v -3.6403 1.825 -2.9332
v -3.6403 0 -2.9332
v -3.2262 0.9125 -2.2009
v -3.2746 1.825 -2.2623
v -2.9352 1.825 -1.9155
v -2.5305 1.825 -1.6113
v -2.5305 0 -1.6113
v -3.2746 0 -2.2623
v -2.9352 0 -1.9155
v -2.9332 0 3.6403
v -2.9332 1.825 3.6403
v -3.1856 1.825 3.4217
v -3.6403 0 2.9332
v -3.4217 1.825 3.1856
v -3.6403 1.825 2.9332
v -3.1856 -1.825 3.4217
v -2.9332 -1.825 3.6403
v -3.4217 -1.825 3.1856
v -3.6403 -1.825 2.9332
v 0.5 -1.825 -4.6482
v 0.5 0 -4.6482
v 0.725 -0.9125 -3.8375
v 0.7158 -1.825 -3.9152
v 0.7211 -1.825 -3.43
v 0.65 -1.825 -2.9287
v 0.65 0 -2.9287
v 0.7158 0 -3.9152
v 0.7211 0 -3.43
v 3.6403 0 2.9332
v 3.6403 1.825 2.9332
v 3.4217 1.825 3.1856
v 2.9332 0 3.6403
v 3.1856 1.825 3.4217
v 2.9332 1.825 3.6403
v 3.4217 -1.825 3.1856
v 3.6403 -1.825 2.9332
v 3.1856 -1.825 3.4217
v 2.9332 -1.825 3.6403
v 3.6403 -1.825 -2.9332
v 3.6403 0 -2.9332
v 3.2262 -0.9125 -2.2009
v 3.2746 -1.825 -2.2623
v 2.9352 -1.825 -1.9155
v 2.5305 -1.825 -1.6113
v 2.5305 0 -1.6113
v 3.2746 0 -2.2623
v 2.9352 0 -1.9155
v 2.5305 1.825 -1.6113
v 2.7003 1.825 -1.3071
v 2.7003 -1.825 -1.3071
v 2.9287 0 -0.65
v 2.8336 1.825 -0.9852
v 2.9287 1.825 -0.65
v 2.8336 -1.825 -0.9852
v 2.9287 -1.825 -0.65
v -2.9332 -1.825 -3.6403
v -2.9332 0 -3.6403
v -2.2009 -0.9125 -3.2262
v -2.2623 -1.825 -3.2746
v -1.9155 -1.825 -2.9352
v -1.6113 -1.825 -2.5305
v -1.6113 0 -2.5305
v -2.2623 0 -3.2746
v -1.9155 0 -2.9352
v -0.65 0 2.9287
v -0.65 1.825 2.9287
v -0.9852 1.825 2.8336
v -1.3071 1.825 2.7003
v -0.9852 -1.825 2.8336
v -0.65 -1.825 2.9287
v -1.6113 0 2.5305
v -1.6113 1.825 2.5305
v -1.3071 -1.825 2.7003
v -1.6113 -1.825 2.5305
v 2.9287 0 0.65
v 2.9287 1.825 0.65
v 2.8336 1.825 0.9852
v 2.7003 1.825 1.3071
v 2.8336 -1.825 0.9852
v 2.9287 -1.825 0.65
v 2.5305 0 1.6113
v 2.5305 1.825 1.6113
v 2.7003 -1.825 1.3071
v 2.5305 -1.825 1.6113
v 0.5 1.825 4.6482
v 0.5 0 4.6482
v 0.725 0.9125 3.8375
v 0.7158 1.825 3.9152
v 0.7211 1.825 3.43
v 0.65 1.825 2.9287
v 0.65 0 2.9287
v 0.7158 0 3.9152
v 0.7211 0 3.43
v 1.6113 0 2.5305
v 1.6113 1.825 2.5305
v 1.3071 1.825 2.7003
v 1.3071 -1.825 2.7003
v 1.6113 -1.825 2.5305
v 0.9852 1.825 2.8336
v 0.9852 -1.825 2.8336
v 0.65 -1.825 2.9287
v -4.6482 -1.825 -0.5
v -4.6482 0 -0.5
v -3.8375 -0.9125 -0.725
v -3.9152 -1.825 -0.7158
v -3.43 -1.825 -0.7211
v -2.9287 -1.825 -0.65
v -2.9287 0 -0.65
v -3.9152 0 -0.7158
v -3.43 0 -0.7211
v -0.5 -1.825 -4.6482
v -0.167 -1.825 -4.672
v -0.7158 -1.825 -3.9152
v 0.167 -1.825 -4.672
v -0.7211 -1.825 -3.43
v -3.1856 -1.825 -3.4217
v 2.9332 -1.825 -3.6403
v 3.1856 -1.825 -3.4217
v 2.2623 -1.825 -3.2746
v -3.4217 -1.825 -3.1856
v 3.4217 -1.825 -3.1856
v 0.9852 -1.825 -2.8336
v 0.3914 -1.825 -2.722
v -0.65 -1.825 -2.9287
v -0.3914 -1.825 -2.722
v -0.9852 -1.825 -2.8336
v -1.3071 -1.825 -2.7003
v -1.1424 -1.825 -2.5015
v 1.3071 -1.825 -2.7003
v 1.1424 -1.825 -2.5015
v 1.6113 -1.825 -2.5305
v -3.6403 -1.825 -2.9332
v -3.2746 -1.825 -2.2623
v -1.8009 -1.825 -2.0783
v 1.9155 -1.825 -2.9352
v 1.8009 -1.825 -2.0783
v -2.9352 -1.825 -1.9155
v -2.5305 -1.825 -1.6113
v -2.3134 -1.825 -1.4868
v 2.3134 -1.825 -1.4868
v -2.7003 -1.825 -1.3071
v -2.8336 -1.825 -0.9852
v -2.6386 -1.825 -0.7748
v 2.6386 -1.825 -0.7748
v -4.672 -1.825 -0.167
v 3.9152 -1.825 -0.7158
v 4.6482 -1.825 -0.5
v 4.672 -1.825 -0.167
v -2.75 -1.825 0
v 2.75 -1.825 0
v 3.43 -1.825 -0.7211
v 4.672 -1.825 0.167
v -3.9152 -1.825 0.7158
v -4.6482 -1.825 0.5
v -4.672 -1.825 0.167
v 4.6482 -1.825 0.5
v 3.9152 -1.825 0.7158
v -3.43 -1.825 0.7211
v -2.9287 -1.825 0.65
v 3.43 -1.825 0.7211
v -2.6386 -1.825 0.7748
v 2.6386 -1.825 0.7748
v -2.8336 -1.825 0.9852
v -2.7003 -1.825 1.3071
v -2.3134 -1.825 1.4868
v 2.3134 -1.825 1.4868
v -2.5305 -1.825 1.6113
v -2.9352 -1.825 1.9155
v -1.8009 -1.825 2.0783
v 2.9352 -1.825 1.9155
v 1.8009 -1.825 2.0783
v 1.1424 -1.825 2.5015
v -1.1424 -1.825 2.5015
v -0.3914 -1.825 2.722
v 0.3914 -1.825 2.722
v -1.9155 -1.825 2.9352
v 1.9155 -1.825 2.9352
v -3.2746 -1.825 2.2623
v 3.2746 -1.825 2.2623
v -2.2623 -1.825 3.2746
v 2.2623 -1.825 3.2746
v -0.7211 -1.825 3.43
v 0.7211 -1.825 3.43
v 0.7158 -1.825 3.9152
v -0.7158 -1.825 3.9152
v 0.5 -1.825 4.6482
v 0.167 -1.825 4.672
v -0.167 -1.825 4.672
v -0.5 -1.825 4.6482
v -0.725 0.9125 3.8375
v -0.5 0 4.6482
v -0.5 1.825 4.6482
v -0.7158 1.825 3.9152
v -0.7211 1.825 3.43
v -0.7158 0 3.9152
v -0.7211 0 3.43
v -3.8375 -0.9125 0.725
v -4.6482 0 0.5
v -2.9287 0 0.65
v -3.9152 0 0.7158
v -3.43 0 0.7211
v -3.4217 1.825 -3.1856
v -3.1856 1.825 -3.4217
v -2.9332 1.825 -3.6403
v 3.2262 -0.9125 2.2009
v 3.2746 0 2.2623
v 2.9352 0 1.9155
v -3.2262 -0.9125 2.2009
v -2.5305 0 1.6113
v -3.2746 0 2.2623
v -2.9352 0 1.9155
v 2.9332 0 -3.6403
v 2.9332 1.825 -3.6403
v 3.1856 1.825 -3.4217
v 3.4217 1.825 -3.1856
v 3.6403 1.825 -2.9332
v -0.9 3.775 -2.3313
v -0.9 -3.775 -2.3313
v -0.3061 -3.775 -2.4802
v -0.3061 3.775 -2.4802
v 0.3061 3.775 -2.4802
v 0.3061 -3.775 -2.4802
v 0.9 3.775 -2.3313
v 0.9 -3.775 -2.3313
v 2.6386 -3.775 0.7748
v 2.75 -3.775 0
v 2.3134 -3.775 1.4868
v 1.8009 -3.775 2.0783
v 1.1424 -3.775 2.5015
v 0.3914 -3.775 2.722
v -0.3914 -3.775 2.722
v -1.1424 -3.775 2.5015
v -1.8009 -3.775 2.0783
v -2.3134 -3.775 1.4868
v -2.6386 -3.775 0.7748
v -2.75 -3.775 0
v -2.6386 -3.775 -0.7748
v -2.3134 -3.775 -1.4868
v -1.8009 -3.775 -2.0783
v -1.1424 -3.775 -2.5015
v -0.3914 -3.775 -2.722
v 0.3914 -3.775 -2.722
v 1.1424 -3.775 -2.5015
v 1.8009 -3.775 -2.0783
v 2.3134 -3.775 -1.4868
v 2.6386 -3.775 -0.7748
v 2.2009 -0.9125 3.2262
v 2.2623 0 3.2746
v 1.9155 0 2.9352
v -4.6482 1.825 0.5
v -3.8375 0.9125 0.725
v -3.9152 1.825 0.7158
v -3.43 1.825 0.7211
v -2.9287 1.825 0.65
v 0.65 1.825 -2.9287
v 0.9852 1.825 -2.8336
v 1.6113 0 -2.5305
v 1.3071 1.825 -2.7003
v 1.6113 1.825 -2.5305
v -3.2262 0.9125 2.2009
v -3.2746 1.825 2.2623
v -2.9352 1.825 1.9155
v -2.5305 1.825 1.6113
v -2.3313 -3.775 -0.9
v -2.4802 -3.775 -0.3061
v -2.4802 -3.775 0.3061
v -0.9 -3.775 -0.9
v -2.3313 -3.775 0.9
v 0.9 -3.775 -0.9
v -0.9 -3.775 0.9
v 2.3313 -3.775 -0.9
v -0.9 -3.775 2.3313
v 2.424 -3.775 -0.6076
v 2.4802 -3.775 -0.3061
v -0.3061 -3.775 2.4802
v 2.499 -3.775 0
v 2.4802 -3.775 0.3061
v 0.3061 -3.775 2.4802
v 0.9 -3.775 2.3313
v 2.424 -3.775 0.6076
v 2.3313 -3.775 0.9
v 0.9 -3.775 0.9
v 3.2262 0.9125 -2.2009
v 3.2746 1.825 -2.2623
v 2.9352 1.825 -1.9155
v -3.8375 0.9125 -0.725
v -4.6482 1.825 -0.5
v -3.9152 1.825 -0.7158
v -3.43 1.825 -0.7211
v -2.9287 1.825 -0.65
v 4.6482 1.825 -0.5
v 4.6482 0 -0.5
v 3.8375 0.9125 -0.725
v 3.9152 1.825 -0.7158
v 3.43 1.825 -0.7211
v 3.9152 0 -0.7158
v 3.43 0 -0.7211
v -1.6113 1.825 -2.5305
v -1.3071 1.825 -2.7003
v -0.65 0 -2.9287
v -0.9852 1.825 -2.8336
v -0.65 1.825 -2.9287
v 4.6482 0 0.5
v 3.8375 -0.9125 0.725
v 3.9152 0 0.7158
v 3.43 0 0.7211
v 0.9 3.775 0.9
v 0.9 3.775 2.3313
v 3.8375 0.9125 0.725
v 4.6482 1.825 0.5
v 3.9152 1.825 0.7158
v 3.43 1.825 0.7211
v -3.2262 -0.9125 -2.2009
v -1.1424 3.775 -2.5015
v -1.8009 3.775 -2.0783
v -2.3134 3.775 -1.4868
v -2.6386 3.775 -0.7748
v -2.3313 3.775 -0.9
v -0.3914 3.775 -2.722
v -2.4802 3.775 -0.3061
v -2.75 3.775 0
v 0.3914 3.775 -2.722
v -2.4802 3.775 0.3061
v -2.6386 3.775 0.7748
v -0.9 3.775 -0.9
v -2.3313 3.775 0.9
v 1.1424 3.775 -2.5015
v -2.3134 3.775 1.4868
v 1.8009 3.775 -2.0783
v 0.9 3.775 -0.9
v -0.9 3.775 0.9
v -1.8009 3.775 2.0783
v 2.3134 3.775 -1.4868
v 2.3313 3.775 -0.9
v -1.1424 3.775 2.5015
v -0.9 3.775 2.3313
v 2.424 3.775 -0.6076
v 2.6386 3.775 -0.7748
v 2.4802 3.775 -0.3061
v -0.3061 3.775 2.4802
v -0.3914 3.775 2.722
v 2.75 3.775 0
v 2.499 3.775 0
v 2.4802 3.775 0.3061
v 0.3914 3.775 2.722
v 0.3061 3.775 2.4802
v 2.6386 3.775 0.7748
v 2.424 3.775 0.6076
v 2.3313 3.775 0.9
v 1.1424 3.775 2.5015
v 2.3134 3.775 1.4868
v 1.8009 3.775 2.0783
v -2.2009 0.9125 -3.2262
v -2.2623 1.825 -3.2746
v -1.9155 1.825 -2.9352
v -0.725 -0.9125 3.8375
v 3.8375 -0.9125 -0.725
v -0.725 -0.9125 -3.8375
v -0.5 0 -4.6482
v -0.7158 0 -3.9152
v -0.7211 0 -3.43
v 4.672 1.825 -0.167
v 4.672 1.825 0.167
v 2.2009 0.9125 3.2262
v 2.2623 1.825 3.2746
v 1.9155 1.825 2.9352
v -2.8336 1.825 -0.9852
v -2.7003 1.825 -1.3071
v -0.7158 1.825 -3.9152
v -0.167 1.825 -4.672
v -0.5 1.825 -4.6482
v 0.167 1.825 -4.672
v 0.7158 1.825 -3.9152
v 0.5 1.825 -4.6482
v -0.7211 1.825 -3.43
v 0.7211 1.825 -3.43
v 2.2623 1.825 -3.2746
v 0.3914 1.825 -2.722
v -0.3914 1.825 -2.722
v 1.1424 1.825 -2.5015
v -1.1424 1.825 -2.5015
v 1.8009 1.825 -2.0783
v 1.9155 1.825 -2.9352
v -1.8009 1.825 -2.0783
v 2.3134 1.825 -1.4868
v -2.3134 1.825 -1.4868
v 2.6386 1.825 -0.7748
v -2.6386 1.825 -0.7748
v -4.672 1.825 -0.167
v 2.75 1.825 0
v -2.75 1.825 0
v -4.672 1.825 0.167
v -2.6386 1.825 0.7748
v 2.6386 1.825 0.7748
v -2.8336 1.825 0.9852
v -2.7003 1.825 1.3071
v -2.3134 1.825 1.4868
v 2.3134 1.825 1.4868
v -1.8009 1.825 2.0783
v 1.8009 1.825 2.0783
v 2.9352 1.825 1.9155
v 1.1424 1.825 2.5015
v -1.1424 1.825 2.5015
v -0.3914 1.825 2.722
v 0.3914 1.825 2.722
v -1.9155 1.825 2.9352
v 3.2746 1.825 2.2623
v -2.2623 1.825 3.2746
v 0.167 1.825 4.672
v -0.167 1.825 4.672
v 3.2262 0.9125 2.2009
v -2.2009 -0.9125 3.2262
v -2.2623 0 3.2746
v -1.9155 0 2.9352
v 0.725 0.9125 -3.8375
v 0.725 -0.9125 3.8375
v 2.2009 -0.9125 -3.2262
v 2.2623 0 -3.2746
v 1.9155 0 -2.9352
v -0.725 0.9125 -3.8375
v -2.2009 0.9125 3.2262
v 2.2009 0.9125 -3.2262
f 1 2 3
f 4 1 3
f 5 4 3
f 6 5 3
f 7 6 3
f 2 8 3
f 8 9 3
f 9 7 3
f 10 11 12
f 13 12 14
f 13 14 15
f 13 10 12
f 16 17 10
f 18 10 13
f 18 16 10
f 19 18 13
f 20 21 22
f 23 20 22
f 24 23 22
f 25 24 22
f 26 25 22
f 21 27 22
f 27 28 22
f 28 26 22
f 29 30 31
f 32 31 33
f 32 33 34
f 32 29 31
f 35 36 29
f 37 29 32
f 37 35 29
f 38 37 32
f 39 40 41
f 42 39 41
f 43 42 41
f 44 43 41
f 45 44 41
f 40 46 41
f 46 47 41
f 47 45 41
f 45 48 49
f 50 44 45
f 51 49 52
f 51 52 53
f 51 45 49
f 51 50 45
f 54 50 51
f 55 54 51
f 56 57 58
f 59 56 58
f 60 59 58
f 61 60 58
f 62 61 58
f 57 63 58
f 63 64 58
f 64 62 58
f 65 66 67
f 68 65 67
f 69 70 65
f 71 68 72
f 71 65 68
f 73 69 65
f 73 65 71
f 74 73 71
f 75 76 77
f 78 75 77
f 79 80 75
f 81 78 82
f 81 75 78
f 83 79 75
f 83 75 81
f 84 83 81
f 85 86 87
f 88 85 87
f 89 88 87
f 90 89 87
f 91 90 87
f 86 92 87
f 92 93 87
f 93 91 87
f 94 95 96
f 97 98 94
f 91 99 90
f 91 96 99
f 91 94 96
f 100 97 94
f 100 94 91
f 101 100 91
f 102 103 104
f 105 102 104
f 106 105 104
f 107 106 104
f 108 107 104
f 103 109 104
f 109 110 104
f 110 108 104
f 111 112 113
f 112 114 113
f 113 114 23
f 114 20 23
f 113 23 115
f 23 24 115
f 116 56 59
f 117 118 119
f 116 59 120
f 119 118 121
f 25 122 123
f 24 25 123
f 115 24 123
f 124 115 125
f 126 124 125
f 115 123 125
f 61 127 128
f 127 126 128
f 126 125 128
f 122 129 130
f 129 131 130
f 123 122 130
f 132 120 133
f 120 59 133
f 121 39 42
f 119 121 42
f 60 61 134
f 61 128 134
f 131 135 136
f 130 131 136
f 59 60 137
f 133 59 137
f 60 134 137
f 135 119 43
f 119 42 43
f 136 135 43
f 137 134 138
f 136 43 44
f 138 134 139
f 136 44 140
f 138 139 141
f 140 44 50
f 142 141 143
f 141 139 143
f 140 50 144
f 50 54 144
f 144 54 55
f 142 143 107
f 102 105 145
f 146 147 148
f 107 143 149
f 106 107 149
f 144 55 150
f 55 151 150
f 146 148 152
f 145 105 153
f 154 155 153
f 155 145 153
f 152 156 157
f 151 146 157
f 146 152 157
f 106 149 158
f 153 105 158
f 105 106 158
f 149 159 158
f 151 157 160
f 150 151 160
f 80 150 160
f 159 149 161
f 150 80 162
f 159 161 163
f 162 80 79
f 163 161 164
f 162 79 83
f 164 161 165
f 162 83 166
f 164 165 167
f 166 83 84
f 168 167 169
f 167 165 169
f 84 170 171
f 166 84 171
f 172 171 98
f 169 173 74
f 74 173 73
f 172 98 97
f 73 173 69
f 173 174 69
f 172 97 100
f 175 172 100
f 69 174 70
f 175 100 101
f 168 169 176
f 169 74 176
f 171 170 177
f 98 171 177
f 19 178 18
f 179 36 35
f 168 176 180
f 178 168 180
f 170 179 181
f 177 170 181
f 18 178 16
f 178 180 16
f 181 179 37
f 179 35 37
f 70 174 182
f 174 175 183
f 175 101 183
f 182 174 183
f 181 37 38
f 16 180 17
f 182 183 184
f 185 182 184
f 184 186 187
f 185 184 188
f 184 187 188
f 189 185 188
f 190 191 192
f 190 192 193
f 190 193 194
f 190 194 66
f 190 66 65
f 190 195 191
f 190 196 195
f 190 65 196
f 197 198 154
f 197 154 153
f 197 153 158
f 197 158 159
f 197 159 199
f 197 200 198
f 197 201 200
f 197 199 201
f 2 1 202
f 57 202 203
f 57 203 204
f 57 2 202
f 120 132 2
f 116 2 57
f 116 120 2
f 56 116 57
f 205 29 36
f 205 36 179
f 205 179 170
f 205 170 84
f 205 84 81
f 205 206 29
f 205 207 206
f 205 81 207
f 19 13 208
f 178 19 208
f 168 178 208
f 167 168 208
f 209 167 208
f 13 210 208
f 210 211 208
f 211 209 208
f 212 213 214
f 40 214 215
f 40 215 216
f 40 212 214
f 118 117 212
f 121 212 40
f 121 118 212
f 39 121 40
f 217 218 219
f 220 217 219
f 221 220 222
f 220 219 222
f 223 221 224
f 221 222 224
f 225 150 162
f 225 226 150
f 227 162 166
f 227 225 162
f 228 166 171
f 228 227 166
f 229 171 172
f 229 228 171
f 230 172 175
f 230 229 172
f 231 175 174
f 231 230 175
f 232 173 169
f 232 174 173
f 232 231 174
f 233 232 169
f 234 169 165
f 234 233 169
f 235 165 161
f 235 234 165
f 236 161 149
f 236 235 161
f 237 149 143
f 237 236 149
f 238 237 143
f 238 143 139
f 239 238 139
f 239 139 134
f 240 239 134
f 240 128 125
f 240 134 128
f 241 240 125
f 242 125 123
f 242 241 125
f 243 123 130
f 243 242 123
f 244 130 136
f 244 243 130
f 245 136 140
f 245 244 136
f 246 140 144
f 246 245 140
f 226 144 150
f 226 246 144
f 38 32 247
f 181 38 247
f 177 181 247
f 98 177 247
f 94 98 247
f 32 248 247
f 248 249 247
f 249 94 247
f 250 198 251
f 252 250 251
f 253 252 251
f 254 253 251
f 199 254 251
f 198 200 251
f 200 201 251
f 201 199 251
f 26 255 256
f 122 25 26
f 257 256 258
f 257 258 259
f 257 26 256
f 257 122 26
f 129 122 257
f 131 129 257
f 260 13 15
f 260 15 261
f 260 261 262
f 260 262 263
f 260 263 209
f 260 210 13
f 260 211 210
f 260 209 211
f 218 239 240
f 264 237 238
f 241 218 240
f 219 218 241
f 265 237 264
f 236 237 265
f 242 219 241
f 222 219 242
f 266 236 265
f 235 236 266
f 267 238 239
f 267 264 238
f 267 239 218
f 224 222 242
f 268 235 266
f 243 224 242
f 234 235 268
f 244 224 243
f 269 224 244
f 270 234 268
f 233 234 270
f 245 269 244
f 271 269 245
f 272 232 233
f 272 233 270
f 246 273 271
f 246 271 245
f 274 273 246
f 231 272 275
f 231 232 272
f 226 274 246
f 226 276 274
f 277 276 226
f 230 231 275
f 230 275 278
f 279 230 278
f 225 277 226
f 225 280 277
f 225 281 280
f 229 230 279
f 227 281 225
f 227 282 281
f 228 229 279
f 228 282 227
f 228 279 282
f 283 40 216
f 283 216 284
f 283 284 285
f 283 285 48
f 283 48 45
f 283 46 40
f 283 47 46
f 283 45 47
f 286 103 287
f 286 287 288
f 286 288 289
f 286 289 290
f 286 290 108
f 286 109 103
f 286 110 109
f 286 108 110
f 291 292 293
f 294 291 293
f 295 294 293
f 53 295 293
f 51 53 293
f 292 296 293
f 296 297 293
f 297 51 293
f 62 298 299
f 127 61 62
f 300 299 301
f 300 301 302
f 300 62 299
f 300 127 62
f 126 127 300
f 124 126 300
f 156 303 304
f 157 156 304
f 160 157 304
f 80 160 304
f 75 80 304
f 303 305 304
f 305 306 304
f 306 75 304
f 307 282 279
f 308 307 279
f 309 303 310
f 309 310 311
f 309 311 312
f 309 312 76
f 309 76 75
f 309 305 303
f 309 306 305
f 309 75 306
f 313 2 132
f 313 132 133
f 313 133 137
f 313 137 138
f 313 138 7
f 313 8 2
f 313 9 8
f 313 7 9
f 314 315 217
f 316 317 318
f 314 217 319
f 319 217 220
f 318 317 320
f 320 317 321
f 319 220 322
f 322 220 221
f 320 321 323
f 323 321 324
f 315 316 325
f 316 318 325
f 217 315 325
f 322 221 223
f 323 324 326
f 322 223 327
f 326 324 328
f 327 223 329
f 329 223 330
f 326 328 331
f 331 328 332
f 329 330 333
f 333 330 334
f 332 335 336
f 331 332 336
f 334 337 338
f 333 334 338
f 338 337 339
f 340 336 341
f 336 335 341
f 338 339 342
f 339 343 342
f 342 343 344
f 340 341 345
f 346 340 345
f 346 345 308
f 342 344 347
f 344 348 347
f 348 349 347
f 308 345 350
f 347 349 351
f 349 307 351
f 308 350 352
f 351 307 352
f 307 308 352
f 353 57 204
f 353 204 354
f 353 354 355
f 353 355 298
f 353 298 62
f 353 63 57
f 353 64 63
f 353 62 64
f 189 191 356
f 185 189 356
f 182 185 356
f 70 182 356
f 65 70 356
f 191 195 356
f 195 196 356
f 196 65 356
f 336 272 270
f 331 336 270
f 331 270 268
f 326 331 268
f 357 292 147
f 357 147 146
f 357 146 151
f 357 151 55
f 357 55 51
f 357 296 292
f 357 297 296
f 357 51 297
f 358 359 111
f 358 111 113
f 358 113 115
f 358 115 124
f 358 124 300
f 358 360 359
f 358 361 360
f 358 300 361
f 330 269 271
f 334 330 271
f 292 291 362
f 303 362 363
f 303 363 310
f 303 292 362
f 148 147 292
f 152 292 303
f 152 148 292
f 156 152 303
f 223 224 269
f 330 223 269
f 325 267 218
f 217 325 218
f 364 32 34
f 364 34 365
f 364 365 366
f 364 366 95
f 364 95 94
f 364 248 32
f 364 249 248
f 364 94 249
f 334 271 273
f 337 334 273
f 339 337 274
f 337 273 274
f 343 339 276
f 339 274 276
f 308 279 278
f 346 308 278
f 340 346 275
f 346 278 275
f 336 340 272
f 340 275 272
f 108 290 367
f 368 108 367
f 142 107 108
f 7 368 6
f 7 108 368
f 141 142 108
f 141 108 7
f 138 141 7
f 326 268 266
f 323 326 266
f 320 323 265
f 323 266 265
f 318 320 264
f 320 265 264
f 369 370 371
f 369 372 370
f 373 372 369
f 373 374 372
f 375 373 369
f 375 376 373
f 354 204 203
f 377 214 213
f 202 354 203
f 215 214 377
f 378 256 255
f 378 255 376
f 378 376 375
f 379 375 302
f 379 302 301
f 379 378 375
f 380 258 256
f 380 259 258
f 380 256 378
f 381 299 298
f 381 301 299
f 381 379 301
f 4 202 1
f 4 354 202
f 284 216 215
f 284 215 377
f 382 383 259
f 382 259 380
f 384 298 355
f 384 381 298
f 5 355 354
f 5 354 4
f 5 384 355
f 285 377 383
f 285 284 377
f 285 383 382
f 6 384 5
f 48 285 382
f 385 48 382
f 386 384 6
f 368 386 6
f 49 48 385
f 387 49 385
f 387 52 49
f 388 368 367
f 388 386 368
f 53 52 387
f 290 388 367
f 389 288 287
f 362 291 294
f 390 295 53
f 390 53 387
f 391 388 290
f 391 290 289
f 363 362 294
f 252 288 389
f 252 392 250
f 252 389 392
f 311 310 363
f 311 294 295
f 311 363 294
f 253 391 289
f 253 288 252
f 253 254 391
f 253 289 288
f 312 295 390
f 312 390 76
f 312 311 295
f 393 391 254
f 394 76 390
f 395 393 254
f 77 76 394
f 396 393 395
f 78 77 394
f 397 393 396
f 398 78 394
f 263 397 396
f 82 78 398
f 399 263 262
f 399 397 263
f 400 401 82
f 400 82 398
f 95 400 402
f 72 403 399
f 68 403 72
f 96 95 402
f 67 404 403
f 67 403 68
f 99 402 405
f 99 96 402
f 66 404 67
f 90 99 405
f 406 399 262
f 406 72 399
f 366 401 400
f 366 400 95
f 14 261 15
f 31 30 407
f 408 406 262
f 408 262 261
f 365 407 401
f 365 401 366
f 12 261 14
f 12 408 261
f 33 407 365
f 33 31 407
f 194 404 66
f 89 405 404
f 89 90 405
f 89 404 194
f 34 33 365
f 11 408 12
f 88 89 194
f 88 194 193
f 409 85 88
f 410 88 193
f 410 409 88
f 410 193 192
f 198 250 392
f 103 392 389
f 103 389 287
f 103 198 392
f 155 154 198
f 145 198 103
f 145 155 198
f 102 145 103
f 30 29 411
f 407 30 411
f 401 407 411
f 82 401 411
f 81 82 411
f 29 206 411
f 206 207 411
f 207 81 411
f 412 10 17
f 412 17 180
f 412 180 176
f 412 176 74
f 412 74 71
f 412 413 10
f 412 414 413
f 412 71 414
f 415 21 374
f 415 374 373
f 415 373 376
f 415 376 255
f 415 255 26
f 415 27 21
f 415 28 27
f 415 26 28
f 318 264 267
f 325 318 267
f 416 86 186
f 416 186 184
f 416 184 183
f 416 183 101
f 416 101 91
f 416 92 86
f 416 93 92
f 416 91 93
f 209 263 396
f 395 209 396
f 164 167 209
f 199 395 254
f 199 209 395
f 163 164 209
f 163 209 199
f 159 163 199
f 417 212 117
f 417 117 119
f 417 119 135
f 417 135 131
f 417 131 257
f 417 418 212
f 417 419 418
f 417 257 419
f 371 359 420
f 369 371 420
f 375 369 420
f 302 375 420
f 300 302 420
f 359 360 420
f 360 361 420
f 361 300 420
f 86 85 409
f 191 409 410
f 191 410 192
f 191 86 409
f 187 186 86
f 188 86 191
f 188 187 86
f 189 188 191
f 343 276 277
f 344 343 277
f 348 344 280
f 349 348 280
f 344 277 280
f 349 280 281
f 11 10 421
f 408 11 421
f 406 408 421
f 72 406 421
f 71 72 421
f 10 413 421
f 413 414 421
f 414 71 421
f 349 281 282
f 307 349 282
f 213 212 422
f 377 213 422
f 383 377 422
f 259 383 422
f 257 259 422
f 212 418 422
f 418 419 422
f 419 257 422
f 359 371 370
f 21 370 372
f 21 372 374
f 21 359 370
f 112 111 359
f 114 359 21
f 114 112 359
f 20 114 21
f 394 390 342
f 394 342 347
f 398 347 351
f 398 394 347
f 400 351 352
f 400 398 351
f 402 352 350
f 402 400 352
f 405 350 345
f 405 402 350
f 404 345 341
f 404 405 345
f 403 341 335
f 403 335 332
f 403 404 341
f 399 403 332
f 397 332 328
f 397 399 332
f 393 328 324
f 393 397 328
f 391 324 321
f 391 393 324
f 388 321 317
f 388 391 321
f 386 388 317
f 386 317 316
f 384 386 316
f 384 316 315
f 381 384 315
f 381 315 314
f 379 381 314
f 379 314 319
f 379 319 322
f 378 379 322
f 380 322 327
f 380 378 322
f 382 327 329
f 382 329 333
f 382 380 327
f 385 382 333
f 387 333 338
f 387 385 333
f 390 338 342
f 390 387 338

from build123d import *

# Parameters (mm, degrees)
F0_R     = 2.75
F1_DEPTH = 1.825
F3_COUNT = 8
F4_DEPTH = 3.775
F6_DEPTH = 7.551


with BuildPart() as f1:
    # F0 (on Front) → F1 (new body, symmetric)
    with BuildSketch(Plane.XZ):
        with BuildLine():
            add(Edge.make_bspline(
                [(0.5, 4.6481851297), (0.5992553827, 4.3830381396), (0.8018424102, 3.8418549905), (0.7012885529, 3.2371652786), (0.65, 2.9287369291)],
                knots=[0, 0, 0, 0, 0.489939479, 1, 1, 1, 1], degree=3))
            ThreePointArc((0.5, 4.6481851297), (0, 4.675), (-0.5, 4.6481851297))
            add(Edge.make_bspline(
                [(-0.5, 4.6481851297), (-0.5992553827, 4.3830381396), (-0.8018424102, 3.8418549905), (-0.7012885529, 3.2371652786), (-0.65, 2.9287369291)],
                knots=[0, 0, 0, 0, 0.489939479, 1, 1, 1, 1], degree=3))
            ThreePointArc((-0.65, 2.9287369291), (0, 3), (0.65, 2.9287369291))
        make_face()
        with BuildLine():
            ThreePointArc((3, 0), (2.3398717914, 1.8774983356), (0.65, 2.9287369291))
            ThreePointArc((0.65, 2.9287369291), (0, 3), (-0.65, 2.9287369291))
            ThreePointArc((-0.65, 2.9287369291), (-1.8774983356, -2.3398717914), (3, 0))
        make_face()
        Circle(F0_R, mode=Mode.SUBTRACT)
    extrude(amount=F1_DEPTH, both=True)

    # F3: F1 ×8 about axis
    f3_axis = Axis((0, -1.825, 0), (0, -1, 0))


with BuildPart() as f1_1:
    add(f1.part)
    for i in range(1, F3_COUNT):
        add(f1.part.rotate(f3_axis, i * 360 / F3_COUNT))

    # F0 (on Front) → F4 (join, symmetric)
    with BuildSketch(Plane.XZ):
        Circle(F0_R)
    extrude(amount=F4_DEPTH, both=True)

    # F5 (on face) → F6 (cut, through all)
    with BuildSketch(Plane.XZ.offset(3.775)):
        with BuildLine():
            ThreePointArc((2.3313088598, -0.9), (2.4567195445, -0.4577445572), (2.499, 0))
            ThreePointArc((2.499, 0), (2.4567195445, 0.4577445572), (2.3313088598, 0.9))
            Line((2.3313088598, 0.9), (0.9, 0.9))
            Line((0.9, 0.9), (0.9, 2.3313088598))
            ThreePointArc((0.9, 2.3313088598), (0, 2.499), (-0.9, 2.3313088598))
            Line((-0.9, 2.3313088598), (-0.9, 0.9))
            Line((-0.9, 0.9), (-2.3313088598, 0.9))
            ThreePointArc((-2.3313088598, 0.9), (-2.499, 0), (-2.3313088598, -0.9))
            Line((-2.3313088598, -0.9), (-0.9, -0.9))
            Line((-0.9, -0.9), (-0.9, -2.3313088598))
            ThreePointArc((-0.9, -2.3313088598), (0, -2.499), (0.9, -2.3313088598))
            Line((0.9, -2.3313088598), (0.9, -0.9))
            Line((0.9, -0.9), (2.3313088598, -0.9))
        make_face()
    extrude(amount=-F6_DEPTH, mode=Mode.SUBTRACT)


solid = f1_1.part
